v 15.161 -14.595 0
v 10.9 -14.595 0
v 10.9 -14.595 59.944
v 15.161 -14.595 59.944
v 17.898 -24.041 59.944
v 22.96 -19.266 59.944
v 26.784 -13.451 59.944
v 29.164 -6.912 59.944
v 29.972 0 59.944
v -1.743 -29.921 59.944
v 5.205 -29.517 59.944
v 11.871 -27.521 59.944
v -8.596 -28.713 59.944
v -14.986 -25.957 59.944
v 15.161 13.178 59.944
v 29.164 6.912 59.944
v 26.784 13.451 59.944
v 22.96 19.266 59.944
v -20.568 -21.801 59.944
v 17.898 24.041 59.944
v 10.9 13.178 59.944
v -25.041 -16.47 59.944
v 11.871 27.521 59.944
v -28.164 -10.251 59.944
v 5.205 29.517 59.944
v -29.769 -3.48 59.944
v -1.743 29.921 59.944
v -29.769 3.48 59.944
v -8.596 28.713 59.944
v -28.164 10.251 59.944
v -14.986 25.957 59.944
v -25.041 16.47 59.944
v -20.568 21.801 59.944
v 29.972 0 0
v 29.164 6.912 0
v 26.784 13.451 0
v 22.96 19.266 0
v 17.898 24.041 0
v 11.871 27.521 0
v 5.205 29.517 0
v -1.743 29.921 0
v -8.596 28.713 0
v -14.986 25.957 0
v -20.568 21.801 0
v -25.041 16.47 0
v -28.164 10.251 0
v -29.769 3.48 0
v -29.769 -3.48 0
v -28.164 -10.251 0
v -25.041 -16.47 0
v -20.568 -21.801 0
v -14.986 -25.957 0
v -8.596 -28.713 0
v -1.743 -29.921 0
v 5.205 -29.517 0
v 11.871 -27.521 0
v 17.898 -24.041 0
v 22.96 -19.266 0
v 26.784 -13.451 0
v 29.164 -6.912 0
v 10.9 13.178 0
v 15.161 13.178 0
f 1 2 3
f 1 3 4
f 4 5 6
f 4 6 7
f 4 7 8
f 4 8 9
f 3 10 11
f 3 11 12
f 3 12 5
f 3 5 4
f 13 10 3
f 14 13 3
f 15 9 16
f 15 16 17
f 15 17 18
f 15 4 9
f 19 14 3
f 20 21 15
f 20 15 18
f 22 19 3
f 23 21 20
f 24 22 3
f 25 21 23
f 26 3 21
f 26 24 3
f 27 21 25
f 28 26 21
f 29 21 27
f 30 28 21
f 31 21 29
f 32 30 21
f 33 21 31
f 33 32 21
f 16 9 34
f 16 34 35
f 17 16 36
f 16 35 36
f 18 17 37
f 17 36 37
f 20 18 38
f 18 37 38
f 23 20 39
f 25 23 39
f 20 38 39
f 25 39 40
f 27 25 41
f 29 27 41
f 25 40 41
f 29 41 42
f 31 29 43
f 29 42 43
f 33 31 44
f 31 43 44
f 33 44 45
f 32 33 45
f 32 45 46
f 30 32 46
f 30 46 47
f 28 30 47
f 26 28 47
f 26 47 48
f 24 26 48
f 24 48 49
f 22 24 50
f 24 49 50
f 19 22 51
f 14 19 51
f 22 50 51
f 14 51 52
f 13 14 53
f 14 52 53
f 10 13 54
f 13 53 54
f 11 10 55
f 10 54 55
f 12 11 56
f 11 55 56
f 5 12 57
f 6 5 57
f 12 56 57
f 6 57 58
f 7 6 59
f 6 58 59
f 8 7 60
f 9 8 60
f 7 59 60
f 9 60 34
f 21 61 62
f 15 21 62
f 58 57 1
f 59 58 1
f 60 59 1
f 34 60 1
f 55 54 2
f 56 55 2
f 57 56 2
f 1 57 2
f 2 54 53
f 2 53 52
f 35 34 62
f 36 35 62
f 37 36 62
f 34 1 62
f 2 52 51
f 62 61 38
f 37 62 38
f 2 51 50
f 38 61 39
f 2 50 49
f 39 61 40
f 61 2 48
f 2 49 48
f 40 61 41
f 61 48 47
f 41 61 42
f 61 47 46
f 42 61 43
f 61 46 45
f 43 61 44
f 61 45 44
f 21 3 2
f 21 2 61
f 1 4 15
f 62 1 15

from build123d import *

# Parameters (mm, degrees)
F0_R     = 29.972
F0_W     = 29.6613248065
F0_H     = 27.7720661834
F1_DEPTH = 59.944
F2_DEPTH = 25.4


with BuildPart() as f1:
    # F0 (on Top) → F1 (new body)
    with BuildSketch(Plane.XY):
        Circle(F0_R)
        with Locations((0.330620911, -0.7084705867)):
            Rectangle(F0_W, F0_H, mode=Mode.SUBTRACT)
    extrude(amount=F1_DEPTH)

    # F2 (add): a face of the model
    f2_faces = [f1.faces().sort_by_distance(p)[0] for p in [
        (-14.5000414923, -0.7084705867, 29.972),
    ]]
    extrude(f2_faces, amount=F2_DEPTH)


solid = f1.part
